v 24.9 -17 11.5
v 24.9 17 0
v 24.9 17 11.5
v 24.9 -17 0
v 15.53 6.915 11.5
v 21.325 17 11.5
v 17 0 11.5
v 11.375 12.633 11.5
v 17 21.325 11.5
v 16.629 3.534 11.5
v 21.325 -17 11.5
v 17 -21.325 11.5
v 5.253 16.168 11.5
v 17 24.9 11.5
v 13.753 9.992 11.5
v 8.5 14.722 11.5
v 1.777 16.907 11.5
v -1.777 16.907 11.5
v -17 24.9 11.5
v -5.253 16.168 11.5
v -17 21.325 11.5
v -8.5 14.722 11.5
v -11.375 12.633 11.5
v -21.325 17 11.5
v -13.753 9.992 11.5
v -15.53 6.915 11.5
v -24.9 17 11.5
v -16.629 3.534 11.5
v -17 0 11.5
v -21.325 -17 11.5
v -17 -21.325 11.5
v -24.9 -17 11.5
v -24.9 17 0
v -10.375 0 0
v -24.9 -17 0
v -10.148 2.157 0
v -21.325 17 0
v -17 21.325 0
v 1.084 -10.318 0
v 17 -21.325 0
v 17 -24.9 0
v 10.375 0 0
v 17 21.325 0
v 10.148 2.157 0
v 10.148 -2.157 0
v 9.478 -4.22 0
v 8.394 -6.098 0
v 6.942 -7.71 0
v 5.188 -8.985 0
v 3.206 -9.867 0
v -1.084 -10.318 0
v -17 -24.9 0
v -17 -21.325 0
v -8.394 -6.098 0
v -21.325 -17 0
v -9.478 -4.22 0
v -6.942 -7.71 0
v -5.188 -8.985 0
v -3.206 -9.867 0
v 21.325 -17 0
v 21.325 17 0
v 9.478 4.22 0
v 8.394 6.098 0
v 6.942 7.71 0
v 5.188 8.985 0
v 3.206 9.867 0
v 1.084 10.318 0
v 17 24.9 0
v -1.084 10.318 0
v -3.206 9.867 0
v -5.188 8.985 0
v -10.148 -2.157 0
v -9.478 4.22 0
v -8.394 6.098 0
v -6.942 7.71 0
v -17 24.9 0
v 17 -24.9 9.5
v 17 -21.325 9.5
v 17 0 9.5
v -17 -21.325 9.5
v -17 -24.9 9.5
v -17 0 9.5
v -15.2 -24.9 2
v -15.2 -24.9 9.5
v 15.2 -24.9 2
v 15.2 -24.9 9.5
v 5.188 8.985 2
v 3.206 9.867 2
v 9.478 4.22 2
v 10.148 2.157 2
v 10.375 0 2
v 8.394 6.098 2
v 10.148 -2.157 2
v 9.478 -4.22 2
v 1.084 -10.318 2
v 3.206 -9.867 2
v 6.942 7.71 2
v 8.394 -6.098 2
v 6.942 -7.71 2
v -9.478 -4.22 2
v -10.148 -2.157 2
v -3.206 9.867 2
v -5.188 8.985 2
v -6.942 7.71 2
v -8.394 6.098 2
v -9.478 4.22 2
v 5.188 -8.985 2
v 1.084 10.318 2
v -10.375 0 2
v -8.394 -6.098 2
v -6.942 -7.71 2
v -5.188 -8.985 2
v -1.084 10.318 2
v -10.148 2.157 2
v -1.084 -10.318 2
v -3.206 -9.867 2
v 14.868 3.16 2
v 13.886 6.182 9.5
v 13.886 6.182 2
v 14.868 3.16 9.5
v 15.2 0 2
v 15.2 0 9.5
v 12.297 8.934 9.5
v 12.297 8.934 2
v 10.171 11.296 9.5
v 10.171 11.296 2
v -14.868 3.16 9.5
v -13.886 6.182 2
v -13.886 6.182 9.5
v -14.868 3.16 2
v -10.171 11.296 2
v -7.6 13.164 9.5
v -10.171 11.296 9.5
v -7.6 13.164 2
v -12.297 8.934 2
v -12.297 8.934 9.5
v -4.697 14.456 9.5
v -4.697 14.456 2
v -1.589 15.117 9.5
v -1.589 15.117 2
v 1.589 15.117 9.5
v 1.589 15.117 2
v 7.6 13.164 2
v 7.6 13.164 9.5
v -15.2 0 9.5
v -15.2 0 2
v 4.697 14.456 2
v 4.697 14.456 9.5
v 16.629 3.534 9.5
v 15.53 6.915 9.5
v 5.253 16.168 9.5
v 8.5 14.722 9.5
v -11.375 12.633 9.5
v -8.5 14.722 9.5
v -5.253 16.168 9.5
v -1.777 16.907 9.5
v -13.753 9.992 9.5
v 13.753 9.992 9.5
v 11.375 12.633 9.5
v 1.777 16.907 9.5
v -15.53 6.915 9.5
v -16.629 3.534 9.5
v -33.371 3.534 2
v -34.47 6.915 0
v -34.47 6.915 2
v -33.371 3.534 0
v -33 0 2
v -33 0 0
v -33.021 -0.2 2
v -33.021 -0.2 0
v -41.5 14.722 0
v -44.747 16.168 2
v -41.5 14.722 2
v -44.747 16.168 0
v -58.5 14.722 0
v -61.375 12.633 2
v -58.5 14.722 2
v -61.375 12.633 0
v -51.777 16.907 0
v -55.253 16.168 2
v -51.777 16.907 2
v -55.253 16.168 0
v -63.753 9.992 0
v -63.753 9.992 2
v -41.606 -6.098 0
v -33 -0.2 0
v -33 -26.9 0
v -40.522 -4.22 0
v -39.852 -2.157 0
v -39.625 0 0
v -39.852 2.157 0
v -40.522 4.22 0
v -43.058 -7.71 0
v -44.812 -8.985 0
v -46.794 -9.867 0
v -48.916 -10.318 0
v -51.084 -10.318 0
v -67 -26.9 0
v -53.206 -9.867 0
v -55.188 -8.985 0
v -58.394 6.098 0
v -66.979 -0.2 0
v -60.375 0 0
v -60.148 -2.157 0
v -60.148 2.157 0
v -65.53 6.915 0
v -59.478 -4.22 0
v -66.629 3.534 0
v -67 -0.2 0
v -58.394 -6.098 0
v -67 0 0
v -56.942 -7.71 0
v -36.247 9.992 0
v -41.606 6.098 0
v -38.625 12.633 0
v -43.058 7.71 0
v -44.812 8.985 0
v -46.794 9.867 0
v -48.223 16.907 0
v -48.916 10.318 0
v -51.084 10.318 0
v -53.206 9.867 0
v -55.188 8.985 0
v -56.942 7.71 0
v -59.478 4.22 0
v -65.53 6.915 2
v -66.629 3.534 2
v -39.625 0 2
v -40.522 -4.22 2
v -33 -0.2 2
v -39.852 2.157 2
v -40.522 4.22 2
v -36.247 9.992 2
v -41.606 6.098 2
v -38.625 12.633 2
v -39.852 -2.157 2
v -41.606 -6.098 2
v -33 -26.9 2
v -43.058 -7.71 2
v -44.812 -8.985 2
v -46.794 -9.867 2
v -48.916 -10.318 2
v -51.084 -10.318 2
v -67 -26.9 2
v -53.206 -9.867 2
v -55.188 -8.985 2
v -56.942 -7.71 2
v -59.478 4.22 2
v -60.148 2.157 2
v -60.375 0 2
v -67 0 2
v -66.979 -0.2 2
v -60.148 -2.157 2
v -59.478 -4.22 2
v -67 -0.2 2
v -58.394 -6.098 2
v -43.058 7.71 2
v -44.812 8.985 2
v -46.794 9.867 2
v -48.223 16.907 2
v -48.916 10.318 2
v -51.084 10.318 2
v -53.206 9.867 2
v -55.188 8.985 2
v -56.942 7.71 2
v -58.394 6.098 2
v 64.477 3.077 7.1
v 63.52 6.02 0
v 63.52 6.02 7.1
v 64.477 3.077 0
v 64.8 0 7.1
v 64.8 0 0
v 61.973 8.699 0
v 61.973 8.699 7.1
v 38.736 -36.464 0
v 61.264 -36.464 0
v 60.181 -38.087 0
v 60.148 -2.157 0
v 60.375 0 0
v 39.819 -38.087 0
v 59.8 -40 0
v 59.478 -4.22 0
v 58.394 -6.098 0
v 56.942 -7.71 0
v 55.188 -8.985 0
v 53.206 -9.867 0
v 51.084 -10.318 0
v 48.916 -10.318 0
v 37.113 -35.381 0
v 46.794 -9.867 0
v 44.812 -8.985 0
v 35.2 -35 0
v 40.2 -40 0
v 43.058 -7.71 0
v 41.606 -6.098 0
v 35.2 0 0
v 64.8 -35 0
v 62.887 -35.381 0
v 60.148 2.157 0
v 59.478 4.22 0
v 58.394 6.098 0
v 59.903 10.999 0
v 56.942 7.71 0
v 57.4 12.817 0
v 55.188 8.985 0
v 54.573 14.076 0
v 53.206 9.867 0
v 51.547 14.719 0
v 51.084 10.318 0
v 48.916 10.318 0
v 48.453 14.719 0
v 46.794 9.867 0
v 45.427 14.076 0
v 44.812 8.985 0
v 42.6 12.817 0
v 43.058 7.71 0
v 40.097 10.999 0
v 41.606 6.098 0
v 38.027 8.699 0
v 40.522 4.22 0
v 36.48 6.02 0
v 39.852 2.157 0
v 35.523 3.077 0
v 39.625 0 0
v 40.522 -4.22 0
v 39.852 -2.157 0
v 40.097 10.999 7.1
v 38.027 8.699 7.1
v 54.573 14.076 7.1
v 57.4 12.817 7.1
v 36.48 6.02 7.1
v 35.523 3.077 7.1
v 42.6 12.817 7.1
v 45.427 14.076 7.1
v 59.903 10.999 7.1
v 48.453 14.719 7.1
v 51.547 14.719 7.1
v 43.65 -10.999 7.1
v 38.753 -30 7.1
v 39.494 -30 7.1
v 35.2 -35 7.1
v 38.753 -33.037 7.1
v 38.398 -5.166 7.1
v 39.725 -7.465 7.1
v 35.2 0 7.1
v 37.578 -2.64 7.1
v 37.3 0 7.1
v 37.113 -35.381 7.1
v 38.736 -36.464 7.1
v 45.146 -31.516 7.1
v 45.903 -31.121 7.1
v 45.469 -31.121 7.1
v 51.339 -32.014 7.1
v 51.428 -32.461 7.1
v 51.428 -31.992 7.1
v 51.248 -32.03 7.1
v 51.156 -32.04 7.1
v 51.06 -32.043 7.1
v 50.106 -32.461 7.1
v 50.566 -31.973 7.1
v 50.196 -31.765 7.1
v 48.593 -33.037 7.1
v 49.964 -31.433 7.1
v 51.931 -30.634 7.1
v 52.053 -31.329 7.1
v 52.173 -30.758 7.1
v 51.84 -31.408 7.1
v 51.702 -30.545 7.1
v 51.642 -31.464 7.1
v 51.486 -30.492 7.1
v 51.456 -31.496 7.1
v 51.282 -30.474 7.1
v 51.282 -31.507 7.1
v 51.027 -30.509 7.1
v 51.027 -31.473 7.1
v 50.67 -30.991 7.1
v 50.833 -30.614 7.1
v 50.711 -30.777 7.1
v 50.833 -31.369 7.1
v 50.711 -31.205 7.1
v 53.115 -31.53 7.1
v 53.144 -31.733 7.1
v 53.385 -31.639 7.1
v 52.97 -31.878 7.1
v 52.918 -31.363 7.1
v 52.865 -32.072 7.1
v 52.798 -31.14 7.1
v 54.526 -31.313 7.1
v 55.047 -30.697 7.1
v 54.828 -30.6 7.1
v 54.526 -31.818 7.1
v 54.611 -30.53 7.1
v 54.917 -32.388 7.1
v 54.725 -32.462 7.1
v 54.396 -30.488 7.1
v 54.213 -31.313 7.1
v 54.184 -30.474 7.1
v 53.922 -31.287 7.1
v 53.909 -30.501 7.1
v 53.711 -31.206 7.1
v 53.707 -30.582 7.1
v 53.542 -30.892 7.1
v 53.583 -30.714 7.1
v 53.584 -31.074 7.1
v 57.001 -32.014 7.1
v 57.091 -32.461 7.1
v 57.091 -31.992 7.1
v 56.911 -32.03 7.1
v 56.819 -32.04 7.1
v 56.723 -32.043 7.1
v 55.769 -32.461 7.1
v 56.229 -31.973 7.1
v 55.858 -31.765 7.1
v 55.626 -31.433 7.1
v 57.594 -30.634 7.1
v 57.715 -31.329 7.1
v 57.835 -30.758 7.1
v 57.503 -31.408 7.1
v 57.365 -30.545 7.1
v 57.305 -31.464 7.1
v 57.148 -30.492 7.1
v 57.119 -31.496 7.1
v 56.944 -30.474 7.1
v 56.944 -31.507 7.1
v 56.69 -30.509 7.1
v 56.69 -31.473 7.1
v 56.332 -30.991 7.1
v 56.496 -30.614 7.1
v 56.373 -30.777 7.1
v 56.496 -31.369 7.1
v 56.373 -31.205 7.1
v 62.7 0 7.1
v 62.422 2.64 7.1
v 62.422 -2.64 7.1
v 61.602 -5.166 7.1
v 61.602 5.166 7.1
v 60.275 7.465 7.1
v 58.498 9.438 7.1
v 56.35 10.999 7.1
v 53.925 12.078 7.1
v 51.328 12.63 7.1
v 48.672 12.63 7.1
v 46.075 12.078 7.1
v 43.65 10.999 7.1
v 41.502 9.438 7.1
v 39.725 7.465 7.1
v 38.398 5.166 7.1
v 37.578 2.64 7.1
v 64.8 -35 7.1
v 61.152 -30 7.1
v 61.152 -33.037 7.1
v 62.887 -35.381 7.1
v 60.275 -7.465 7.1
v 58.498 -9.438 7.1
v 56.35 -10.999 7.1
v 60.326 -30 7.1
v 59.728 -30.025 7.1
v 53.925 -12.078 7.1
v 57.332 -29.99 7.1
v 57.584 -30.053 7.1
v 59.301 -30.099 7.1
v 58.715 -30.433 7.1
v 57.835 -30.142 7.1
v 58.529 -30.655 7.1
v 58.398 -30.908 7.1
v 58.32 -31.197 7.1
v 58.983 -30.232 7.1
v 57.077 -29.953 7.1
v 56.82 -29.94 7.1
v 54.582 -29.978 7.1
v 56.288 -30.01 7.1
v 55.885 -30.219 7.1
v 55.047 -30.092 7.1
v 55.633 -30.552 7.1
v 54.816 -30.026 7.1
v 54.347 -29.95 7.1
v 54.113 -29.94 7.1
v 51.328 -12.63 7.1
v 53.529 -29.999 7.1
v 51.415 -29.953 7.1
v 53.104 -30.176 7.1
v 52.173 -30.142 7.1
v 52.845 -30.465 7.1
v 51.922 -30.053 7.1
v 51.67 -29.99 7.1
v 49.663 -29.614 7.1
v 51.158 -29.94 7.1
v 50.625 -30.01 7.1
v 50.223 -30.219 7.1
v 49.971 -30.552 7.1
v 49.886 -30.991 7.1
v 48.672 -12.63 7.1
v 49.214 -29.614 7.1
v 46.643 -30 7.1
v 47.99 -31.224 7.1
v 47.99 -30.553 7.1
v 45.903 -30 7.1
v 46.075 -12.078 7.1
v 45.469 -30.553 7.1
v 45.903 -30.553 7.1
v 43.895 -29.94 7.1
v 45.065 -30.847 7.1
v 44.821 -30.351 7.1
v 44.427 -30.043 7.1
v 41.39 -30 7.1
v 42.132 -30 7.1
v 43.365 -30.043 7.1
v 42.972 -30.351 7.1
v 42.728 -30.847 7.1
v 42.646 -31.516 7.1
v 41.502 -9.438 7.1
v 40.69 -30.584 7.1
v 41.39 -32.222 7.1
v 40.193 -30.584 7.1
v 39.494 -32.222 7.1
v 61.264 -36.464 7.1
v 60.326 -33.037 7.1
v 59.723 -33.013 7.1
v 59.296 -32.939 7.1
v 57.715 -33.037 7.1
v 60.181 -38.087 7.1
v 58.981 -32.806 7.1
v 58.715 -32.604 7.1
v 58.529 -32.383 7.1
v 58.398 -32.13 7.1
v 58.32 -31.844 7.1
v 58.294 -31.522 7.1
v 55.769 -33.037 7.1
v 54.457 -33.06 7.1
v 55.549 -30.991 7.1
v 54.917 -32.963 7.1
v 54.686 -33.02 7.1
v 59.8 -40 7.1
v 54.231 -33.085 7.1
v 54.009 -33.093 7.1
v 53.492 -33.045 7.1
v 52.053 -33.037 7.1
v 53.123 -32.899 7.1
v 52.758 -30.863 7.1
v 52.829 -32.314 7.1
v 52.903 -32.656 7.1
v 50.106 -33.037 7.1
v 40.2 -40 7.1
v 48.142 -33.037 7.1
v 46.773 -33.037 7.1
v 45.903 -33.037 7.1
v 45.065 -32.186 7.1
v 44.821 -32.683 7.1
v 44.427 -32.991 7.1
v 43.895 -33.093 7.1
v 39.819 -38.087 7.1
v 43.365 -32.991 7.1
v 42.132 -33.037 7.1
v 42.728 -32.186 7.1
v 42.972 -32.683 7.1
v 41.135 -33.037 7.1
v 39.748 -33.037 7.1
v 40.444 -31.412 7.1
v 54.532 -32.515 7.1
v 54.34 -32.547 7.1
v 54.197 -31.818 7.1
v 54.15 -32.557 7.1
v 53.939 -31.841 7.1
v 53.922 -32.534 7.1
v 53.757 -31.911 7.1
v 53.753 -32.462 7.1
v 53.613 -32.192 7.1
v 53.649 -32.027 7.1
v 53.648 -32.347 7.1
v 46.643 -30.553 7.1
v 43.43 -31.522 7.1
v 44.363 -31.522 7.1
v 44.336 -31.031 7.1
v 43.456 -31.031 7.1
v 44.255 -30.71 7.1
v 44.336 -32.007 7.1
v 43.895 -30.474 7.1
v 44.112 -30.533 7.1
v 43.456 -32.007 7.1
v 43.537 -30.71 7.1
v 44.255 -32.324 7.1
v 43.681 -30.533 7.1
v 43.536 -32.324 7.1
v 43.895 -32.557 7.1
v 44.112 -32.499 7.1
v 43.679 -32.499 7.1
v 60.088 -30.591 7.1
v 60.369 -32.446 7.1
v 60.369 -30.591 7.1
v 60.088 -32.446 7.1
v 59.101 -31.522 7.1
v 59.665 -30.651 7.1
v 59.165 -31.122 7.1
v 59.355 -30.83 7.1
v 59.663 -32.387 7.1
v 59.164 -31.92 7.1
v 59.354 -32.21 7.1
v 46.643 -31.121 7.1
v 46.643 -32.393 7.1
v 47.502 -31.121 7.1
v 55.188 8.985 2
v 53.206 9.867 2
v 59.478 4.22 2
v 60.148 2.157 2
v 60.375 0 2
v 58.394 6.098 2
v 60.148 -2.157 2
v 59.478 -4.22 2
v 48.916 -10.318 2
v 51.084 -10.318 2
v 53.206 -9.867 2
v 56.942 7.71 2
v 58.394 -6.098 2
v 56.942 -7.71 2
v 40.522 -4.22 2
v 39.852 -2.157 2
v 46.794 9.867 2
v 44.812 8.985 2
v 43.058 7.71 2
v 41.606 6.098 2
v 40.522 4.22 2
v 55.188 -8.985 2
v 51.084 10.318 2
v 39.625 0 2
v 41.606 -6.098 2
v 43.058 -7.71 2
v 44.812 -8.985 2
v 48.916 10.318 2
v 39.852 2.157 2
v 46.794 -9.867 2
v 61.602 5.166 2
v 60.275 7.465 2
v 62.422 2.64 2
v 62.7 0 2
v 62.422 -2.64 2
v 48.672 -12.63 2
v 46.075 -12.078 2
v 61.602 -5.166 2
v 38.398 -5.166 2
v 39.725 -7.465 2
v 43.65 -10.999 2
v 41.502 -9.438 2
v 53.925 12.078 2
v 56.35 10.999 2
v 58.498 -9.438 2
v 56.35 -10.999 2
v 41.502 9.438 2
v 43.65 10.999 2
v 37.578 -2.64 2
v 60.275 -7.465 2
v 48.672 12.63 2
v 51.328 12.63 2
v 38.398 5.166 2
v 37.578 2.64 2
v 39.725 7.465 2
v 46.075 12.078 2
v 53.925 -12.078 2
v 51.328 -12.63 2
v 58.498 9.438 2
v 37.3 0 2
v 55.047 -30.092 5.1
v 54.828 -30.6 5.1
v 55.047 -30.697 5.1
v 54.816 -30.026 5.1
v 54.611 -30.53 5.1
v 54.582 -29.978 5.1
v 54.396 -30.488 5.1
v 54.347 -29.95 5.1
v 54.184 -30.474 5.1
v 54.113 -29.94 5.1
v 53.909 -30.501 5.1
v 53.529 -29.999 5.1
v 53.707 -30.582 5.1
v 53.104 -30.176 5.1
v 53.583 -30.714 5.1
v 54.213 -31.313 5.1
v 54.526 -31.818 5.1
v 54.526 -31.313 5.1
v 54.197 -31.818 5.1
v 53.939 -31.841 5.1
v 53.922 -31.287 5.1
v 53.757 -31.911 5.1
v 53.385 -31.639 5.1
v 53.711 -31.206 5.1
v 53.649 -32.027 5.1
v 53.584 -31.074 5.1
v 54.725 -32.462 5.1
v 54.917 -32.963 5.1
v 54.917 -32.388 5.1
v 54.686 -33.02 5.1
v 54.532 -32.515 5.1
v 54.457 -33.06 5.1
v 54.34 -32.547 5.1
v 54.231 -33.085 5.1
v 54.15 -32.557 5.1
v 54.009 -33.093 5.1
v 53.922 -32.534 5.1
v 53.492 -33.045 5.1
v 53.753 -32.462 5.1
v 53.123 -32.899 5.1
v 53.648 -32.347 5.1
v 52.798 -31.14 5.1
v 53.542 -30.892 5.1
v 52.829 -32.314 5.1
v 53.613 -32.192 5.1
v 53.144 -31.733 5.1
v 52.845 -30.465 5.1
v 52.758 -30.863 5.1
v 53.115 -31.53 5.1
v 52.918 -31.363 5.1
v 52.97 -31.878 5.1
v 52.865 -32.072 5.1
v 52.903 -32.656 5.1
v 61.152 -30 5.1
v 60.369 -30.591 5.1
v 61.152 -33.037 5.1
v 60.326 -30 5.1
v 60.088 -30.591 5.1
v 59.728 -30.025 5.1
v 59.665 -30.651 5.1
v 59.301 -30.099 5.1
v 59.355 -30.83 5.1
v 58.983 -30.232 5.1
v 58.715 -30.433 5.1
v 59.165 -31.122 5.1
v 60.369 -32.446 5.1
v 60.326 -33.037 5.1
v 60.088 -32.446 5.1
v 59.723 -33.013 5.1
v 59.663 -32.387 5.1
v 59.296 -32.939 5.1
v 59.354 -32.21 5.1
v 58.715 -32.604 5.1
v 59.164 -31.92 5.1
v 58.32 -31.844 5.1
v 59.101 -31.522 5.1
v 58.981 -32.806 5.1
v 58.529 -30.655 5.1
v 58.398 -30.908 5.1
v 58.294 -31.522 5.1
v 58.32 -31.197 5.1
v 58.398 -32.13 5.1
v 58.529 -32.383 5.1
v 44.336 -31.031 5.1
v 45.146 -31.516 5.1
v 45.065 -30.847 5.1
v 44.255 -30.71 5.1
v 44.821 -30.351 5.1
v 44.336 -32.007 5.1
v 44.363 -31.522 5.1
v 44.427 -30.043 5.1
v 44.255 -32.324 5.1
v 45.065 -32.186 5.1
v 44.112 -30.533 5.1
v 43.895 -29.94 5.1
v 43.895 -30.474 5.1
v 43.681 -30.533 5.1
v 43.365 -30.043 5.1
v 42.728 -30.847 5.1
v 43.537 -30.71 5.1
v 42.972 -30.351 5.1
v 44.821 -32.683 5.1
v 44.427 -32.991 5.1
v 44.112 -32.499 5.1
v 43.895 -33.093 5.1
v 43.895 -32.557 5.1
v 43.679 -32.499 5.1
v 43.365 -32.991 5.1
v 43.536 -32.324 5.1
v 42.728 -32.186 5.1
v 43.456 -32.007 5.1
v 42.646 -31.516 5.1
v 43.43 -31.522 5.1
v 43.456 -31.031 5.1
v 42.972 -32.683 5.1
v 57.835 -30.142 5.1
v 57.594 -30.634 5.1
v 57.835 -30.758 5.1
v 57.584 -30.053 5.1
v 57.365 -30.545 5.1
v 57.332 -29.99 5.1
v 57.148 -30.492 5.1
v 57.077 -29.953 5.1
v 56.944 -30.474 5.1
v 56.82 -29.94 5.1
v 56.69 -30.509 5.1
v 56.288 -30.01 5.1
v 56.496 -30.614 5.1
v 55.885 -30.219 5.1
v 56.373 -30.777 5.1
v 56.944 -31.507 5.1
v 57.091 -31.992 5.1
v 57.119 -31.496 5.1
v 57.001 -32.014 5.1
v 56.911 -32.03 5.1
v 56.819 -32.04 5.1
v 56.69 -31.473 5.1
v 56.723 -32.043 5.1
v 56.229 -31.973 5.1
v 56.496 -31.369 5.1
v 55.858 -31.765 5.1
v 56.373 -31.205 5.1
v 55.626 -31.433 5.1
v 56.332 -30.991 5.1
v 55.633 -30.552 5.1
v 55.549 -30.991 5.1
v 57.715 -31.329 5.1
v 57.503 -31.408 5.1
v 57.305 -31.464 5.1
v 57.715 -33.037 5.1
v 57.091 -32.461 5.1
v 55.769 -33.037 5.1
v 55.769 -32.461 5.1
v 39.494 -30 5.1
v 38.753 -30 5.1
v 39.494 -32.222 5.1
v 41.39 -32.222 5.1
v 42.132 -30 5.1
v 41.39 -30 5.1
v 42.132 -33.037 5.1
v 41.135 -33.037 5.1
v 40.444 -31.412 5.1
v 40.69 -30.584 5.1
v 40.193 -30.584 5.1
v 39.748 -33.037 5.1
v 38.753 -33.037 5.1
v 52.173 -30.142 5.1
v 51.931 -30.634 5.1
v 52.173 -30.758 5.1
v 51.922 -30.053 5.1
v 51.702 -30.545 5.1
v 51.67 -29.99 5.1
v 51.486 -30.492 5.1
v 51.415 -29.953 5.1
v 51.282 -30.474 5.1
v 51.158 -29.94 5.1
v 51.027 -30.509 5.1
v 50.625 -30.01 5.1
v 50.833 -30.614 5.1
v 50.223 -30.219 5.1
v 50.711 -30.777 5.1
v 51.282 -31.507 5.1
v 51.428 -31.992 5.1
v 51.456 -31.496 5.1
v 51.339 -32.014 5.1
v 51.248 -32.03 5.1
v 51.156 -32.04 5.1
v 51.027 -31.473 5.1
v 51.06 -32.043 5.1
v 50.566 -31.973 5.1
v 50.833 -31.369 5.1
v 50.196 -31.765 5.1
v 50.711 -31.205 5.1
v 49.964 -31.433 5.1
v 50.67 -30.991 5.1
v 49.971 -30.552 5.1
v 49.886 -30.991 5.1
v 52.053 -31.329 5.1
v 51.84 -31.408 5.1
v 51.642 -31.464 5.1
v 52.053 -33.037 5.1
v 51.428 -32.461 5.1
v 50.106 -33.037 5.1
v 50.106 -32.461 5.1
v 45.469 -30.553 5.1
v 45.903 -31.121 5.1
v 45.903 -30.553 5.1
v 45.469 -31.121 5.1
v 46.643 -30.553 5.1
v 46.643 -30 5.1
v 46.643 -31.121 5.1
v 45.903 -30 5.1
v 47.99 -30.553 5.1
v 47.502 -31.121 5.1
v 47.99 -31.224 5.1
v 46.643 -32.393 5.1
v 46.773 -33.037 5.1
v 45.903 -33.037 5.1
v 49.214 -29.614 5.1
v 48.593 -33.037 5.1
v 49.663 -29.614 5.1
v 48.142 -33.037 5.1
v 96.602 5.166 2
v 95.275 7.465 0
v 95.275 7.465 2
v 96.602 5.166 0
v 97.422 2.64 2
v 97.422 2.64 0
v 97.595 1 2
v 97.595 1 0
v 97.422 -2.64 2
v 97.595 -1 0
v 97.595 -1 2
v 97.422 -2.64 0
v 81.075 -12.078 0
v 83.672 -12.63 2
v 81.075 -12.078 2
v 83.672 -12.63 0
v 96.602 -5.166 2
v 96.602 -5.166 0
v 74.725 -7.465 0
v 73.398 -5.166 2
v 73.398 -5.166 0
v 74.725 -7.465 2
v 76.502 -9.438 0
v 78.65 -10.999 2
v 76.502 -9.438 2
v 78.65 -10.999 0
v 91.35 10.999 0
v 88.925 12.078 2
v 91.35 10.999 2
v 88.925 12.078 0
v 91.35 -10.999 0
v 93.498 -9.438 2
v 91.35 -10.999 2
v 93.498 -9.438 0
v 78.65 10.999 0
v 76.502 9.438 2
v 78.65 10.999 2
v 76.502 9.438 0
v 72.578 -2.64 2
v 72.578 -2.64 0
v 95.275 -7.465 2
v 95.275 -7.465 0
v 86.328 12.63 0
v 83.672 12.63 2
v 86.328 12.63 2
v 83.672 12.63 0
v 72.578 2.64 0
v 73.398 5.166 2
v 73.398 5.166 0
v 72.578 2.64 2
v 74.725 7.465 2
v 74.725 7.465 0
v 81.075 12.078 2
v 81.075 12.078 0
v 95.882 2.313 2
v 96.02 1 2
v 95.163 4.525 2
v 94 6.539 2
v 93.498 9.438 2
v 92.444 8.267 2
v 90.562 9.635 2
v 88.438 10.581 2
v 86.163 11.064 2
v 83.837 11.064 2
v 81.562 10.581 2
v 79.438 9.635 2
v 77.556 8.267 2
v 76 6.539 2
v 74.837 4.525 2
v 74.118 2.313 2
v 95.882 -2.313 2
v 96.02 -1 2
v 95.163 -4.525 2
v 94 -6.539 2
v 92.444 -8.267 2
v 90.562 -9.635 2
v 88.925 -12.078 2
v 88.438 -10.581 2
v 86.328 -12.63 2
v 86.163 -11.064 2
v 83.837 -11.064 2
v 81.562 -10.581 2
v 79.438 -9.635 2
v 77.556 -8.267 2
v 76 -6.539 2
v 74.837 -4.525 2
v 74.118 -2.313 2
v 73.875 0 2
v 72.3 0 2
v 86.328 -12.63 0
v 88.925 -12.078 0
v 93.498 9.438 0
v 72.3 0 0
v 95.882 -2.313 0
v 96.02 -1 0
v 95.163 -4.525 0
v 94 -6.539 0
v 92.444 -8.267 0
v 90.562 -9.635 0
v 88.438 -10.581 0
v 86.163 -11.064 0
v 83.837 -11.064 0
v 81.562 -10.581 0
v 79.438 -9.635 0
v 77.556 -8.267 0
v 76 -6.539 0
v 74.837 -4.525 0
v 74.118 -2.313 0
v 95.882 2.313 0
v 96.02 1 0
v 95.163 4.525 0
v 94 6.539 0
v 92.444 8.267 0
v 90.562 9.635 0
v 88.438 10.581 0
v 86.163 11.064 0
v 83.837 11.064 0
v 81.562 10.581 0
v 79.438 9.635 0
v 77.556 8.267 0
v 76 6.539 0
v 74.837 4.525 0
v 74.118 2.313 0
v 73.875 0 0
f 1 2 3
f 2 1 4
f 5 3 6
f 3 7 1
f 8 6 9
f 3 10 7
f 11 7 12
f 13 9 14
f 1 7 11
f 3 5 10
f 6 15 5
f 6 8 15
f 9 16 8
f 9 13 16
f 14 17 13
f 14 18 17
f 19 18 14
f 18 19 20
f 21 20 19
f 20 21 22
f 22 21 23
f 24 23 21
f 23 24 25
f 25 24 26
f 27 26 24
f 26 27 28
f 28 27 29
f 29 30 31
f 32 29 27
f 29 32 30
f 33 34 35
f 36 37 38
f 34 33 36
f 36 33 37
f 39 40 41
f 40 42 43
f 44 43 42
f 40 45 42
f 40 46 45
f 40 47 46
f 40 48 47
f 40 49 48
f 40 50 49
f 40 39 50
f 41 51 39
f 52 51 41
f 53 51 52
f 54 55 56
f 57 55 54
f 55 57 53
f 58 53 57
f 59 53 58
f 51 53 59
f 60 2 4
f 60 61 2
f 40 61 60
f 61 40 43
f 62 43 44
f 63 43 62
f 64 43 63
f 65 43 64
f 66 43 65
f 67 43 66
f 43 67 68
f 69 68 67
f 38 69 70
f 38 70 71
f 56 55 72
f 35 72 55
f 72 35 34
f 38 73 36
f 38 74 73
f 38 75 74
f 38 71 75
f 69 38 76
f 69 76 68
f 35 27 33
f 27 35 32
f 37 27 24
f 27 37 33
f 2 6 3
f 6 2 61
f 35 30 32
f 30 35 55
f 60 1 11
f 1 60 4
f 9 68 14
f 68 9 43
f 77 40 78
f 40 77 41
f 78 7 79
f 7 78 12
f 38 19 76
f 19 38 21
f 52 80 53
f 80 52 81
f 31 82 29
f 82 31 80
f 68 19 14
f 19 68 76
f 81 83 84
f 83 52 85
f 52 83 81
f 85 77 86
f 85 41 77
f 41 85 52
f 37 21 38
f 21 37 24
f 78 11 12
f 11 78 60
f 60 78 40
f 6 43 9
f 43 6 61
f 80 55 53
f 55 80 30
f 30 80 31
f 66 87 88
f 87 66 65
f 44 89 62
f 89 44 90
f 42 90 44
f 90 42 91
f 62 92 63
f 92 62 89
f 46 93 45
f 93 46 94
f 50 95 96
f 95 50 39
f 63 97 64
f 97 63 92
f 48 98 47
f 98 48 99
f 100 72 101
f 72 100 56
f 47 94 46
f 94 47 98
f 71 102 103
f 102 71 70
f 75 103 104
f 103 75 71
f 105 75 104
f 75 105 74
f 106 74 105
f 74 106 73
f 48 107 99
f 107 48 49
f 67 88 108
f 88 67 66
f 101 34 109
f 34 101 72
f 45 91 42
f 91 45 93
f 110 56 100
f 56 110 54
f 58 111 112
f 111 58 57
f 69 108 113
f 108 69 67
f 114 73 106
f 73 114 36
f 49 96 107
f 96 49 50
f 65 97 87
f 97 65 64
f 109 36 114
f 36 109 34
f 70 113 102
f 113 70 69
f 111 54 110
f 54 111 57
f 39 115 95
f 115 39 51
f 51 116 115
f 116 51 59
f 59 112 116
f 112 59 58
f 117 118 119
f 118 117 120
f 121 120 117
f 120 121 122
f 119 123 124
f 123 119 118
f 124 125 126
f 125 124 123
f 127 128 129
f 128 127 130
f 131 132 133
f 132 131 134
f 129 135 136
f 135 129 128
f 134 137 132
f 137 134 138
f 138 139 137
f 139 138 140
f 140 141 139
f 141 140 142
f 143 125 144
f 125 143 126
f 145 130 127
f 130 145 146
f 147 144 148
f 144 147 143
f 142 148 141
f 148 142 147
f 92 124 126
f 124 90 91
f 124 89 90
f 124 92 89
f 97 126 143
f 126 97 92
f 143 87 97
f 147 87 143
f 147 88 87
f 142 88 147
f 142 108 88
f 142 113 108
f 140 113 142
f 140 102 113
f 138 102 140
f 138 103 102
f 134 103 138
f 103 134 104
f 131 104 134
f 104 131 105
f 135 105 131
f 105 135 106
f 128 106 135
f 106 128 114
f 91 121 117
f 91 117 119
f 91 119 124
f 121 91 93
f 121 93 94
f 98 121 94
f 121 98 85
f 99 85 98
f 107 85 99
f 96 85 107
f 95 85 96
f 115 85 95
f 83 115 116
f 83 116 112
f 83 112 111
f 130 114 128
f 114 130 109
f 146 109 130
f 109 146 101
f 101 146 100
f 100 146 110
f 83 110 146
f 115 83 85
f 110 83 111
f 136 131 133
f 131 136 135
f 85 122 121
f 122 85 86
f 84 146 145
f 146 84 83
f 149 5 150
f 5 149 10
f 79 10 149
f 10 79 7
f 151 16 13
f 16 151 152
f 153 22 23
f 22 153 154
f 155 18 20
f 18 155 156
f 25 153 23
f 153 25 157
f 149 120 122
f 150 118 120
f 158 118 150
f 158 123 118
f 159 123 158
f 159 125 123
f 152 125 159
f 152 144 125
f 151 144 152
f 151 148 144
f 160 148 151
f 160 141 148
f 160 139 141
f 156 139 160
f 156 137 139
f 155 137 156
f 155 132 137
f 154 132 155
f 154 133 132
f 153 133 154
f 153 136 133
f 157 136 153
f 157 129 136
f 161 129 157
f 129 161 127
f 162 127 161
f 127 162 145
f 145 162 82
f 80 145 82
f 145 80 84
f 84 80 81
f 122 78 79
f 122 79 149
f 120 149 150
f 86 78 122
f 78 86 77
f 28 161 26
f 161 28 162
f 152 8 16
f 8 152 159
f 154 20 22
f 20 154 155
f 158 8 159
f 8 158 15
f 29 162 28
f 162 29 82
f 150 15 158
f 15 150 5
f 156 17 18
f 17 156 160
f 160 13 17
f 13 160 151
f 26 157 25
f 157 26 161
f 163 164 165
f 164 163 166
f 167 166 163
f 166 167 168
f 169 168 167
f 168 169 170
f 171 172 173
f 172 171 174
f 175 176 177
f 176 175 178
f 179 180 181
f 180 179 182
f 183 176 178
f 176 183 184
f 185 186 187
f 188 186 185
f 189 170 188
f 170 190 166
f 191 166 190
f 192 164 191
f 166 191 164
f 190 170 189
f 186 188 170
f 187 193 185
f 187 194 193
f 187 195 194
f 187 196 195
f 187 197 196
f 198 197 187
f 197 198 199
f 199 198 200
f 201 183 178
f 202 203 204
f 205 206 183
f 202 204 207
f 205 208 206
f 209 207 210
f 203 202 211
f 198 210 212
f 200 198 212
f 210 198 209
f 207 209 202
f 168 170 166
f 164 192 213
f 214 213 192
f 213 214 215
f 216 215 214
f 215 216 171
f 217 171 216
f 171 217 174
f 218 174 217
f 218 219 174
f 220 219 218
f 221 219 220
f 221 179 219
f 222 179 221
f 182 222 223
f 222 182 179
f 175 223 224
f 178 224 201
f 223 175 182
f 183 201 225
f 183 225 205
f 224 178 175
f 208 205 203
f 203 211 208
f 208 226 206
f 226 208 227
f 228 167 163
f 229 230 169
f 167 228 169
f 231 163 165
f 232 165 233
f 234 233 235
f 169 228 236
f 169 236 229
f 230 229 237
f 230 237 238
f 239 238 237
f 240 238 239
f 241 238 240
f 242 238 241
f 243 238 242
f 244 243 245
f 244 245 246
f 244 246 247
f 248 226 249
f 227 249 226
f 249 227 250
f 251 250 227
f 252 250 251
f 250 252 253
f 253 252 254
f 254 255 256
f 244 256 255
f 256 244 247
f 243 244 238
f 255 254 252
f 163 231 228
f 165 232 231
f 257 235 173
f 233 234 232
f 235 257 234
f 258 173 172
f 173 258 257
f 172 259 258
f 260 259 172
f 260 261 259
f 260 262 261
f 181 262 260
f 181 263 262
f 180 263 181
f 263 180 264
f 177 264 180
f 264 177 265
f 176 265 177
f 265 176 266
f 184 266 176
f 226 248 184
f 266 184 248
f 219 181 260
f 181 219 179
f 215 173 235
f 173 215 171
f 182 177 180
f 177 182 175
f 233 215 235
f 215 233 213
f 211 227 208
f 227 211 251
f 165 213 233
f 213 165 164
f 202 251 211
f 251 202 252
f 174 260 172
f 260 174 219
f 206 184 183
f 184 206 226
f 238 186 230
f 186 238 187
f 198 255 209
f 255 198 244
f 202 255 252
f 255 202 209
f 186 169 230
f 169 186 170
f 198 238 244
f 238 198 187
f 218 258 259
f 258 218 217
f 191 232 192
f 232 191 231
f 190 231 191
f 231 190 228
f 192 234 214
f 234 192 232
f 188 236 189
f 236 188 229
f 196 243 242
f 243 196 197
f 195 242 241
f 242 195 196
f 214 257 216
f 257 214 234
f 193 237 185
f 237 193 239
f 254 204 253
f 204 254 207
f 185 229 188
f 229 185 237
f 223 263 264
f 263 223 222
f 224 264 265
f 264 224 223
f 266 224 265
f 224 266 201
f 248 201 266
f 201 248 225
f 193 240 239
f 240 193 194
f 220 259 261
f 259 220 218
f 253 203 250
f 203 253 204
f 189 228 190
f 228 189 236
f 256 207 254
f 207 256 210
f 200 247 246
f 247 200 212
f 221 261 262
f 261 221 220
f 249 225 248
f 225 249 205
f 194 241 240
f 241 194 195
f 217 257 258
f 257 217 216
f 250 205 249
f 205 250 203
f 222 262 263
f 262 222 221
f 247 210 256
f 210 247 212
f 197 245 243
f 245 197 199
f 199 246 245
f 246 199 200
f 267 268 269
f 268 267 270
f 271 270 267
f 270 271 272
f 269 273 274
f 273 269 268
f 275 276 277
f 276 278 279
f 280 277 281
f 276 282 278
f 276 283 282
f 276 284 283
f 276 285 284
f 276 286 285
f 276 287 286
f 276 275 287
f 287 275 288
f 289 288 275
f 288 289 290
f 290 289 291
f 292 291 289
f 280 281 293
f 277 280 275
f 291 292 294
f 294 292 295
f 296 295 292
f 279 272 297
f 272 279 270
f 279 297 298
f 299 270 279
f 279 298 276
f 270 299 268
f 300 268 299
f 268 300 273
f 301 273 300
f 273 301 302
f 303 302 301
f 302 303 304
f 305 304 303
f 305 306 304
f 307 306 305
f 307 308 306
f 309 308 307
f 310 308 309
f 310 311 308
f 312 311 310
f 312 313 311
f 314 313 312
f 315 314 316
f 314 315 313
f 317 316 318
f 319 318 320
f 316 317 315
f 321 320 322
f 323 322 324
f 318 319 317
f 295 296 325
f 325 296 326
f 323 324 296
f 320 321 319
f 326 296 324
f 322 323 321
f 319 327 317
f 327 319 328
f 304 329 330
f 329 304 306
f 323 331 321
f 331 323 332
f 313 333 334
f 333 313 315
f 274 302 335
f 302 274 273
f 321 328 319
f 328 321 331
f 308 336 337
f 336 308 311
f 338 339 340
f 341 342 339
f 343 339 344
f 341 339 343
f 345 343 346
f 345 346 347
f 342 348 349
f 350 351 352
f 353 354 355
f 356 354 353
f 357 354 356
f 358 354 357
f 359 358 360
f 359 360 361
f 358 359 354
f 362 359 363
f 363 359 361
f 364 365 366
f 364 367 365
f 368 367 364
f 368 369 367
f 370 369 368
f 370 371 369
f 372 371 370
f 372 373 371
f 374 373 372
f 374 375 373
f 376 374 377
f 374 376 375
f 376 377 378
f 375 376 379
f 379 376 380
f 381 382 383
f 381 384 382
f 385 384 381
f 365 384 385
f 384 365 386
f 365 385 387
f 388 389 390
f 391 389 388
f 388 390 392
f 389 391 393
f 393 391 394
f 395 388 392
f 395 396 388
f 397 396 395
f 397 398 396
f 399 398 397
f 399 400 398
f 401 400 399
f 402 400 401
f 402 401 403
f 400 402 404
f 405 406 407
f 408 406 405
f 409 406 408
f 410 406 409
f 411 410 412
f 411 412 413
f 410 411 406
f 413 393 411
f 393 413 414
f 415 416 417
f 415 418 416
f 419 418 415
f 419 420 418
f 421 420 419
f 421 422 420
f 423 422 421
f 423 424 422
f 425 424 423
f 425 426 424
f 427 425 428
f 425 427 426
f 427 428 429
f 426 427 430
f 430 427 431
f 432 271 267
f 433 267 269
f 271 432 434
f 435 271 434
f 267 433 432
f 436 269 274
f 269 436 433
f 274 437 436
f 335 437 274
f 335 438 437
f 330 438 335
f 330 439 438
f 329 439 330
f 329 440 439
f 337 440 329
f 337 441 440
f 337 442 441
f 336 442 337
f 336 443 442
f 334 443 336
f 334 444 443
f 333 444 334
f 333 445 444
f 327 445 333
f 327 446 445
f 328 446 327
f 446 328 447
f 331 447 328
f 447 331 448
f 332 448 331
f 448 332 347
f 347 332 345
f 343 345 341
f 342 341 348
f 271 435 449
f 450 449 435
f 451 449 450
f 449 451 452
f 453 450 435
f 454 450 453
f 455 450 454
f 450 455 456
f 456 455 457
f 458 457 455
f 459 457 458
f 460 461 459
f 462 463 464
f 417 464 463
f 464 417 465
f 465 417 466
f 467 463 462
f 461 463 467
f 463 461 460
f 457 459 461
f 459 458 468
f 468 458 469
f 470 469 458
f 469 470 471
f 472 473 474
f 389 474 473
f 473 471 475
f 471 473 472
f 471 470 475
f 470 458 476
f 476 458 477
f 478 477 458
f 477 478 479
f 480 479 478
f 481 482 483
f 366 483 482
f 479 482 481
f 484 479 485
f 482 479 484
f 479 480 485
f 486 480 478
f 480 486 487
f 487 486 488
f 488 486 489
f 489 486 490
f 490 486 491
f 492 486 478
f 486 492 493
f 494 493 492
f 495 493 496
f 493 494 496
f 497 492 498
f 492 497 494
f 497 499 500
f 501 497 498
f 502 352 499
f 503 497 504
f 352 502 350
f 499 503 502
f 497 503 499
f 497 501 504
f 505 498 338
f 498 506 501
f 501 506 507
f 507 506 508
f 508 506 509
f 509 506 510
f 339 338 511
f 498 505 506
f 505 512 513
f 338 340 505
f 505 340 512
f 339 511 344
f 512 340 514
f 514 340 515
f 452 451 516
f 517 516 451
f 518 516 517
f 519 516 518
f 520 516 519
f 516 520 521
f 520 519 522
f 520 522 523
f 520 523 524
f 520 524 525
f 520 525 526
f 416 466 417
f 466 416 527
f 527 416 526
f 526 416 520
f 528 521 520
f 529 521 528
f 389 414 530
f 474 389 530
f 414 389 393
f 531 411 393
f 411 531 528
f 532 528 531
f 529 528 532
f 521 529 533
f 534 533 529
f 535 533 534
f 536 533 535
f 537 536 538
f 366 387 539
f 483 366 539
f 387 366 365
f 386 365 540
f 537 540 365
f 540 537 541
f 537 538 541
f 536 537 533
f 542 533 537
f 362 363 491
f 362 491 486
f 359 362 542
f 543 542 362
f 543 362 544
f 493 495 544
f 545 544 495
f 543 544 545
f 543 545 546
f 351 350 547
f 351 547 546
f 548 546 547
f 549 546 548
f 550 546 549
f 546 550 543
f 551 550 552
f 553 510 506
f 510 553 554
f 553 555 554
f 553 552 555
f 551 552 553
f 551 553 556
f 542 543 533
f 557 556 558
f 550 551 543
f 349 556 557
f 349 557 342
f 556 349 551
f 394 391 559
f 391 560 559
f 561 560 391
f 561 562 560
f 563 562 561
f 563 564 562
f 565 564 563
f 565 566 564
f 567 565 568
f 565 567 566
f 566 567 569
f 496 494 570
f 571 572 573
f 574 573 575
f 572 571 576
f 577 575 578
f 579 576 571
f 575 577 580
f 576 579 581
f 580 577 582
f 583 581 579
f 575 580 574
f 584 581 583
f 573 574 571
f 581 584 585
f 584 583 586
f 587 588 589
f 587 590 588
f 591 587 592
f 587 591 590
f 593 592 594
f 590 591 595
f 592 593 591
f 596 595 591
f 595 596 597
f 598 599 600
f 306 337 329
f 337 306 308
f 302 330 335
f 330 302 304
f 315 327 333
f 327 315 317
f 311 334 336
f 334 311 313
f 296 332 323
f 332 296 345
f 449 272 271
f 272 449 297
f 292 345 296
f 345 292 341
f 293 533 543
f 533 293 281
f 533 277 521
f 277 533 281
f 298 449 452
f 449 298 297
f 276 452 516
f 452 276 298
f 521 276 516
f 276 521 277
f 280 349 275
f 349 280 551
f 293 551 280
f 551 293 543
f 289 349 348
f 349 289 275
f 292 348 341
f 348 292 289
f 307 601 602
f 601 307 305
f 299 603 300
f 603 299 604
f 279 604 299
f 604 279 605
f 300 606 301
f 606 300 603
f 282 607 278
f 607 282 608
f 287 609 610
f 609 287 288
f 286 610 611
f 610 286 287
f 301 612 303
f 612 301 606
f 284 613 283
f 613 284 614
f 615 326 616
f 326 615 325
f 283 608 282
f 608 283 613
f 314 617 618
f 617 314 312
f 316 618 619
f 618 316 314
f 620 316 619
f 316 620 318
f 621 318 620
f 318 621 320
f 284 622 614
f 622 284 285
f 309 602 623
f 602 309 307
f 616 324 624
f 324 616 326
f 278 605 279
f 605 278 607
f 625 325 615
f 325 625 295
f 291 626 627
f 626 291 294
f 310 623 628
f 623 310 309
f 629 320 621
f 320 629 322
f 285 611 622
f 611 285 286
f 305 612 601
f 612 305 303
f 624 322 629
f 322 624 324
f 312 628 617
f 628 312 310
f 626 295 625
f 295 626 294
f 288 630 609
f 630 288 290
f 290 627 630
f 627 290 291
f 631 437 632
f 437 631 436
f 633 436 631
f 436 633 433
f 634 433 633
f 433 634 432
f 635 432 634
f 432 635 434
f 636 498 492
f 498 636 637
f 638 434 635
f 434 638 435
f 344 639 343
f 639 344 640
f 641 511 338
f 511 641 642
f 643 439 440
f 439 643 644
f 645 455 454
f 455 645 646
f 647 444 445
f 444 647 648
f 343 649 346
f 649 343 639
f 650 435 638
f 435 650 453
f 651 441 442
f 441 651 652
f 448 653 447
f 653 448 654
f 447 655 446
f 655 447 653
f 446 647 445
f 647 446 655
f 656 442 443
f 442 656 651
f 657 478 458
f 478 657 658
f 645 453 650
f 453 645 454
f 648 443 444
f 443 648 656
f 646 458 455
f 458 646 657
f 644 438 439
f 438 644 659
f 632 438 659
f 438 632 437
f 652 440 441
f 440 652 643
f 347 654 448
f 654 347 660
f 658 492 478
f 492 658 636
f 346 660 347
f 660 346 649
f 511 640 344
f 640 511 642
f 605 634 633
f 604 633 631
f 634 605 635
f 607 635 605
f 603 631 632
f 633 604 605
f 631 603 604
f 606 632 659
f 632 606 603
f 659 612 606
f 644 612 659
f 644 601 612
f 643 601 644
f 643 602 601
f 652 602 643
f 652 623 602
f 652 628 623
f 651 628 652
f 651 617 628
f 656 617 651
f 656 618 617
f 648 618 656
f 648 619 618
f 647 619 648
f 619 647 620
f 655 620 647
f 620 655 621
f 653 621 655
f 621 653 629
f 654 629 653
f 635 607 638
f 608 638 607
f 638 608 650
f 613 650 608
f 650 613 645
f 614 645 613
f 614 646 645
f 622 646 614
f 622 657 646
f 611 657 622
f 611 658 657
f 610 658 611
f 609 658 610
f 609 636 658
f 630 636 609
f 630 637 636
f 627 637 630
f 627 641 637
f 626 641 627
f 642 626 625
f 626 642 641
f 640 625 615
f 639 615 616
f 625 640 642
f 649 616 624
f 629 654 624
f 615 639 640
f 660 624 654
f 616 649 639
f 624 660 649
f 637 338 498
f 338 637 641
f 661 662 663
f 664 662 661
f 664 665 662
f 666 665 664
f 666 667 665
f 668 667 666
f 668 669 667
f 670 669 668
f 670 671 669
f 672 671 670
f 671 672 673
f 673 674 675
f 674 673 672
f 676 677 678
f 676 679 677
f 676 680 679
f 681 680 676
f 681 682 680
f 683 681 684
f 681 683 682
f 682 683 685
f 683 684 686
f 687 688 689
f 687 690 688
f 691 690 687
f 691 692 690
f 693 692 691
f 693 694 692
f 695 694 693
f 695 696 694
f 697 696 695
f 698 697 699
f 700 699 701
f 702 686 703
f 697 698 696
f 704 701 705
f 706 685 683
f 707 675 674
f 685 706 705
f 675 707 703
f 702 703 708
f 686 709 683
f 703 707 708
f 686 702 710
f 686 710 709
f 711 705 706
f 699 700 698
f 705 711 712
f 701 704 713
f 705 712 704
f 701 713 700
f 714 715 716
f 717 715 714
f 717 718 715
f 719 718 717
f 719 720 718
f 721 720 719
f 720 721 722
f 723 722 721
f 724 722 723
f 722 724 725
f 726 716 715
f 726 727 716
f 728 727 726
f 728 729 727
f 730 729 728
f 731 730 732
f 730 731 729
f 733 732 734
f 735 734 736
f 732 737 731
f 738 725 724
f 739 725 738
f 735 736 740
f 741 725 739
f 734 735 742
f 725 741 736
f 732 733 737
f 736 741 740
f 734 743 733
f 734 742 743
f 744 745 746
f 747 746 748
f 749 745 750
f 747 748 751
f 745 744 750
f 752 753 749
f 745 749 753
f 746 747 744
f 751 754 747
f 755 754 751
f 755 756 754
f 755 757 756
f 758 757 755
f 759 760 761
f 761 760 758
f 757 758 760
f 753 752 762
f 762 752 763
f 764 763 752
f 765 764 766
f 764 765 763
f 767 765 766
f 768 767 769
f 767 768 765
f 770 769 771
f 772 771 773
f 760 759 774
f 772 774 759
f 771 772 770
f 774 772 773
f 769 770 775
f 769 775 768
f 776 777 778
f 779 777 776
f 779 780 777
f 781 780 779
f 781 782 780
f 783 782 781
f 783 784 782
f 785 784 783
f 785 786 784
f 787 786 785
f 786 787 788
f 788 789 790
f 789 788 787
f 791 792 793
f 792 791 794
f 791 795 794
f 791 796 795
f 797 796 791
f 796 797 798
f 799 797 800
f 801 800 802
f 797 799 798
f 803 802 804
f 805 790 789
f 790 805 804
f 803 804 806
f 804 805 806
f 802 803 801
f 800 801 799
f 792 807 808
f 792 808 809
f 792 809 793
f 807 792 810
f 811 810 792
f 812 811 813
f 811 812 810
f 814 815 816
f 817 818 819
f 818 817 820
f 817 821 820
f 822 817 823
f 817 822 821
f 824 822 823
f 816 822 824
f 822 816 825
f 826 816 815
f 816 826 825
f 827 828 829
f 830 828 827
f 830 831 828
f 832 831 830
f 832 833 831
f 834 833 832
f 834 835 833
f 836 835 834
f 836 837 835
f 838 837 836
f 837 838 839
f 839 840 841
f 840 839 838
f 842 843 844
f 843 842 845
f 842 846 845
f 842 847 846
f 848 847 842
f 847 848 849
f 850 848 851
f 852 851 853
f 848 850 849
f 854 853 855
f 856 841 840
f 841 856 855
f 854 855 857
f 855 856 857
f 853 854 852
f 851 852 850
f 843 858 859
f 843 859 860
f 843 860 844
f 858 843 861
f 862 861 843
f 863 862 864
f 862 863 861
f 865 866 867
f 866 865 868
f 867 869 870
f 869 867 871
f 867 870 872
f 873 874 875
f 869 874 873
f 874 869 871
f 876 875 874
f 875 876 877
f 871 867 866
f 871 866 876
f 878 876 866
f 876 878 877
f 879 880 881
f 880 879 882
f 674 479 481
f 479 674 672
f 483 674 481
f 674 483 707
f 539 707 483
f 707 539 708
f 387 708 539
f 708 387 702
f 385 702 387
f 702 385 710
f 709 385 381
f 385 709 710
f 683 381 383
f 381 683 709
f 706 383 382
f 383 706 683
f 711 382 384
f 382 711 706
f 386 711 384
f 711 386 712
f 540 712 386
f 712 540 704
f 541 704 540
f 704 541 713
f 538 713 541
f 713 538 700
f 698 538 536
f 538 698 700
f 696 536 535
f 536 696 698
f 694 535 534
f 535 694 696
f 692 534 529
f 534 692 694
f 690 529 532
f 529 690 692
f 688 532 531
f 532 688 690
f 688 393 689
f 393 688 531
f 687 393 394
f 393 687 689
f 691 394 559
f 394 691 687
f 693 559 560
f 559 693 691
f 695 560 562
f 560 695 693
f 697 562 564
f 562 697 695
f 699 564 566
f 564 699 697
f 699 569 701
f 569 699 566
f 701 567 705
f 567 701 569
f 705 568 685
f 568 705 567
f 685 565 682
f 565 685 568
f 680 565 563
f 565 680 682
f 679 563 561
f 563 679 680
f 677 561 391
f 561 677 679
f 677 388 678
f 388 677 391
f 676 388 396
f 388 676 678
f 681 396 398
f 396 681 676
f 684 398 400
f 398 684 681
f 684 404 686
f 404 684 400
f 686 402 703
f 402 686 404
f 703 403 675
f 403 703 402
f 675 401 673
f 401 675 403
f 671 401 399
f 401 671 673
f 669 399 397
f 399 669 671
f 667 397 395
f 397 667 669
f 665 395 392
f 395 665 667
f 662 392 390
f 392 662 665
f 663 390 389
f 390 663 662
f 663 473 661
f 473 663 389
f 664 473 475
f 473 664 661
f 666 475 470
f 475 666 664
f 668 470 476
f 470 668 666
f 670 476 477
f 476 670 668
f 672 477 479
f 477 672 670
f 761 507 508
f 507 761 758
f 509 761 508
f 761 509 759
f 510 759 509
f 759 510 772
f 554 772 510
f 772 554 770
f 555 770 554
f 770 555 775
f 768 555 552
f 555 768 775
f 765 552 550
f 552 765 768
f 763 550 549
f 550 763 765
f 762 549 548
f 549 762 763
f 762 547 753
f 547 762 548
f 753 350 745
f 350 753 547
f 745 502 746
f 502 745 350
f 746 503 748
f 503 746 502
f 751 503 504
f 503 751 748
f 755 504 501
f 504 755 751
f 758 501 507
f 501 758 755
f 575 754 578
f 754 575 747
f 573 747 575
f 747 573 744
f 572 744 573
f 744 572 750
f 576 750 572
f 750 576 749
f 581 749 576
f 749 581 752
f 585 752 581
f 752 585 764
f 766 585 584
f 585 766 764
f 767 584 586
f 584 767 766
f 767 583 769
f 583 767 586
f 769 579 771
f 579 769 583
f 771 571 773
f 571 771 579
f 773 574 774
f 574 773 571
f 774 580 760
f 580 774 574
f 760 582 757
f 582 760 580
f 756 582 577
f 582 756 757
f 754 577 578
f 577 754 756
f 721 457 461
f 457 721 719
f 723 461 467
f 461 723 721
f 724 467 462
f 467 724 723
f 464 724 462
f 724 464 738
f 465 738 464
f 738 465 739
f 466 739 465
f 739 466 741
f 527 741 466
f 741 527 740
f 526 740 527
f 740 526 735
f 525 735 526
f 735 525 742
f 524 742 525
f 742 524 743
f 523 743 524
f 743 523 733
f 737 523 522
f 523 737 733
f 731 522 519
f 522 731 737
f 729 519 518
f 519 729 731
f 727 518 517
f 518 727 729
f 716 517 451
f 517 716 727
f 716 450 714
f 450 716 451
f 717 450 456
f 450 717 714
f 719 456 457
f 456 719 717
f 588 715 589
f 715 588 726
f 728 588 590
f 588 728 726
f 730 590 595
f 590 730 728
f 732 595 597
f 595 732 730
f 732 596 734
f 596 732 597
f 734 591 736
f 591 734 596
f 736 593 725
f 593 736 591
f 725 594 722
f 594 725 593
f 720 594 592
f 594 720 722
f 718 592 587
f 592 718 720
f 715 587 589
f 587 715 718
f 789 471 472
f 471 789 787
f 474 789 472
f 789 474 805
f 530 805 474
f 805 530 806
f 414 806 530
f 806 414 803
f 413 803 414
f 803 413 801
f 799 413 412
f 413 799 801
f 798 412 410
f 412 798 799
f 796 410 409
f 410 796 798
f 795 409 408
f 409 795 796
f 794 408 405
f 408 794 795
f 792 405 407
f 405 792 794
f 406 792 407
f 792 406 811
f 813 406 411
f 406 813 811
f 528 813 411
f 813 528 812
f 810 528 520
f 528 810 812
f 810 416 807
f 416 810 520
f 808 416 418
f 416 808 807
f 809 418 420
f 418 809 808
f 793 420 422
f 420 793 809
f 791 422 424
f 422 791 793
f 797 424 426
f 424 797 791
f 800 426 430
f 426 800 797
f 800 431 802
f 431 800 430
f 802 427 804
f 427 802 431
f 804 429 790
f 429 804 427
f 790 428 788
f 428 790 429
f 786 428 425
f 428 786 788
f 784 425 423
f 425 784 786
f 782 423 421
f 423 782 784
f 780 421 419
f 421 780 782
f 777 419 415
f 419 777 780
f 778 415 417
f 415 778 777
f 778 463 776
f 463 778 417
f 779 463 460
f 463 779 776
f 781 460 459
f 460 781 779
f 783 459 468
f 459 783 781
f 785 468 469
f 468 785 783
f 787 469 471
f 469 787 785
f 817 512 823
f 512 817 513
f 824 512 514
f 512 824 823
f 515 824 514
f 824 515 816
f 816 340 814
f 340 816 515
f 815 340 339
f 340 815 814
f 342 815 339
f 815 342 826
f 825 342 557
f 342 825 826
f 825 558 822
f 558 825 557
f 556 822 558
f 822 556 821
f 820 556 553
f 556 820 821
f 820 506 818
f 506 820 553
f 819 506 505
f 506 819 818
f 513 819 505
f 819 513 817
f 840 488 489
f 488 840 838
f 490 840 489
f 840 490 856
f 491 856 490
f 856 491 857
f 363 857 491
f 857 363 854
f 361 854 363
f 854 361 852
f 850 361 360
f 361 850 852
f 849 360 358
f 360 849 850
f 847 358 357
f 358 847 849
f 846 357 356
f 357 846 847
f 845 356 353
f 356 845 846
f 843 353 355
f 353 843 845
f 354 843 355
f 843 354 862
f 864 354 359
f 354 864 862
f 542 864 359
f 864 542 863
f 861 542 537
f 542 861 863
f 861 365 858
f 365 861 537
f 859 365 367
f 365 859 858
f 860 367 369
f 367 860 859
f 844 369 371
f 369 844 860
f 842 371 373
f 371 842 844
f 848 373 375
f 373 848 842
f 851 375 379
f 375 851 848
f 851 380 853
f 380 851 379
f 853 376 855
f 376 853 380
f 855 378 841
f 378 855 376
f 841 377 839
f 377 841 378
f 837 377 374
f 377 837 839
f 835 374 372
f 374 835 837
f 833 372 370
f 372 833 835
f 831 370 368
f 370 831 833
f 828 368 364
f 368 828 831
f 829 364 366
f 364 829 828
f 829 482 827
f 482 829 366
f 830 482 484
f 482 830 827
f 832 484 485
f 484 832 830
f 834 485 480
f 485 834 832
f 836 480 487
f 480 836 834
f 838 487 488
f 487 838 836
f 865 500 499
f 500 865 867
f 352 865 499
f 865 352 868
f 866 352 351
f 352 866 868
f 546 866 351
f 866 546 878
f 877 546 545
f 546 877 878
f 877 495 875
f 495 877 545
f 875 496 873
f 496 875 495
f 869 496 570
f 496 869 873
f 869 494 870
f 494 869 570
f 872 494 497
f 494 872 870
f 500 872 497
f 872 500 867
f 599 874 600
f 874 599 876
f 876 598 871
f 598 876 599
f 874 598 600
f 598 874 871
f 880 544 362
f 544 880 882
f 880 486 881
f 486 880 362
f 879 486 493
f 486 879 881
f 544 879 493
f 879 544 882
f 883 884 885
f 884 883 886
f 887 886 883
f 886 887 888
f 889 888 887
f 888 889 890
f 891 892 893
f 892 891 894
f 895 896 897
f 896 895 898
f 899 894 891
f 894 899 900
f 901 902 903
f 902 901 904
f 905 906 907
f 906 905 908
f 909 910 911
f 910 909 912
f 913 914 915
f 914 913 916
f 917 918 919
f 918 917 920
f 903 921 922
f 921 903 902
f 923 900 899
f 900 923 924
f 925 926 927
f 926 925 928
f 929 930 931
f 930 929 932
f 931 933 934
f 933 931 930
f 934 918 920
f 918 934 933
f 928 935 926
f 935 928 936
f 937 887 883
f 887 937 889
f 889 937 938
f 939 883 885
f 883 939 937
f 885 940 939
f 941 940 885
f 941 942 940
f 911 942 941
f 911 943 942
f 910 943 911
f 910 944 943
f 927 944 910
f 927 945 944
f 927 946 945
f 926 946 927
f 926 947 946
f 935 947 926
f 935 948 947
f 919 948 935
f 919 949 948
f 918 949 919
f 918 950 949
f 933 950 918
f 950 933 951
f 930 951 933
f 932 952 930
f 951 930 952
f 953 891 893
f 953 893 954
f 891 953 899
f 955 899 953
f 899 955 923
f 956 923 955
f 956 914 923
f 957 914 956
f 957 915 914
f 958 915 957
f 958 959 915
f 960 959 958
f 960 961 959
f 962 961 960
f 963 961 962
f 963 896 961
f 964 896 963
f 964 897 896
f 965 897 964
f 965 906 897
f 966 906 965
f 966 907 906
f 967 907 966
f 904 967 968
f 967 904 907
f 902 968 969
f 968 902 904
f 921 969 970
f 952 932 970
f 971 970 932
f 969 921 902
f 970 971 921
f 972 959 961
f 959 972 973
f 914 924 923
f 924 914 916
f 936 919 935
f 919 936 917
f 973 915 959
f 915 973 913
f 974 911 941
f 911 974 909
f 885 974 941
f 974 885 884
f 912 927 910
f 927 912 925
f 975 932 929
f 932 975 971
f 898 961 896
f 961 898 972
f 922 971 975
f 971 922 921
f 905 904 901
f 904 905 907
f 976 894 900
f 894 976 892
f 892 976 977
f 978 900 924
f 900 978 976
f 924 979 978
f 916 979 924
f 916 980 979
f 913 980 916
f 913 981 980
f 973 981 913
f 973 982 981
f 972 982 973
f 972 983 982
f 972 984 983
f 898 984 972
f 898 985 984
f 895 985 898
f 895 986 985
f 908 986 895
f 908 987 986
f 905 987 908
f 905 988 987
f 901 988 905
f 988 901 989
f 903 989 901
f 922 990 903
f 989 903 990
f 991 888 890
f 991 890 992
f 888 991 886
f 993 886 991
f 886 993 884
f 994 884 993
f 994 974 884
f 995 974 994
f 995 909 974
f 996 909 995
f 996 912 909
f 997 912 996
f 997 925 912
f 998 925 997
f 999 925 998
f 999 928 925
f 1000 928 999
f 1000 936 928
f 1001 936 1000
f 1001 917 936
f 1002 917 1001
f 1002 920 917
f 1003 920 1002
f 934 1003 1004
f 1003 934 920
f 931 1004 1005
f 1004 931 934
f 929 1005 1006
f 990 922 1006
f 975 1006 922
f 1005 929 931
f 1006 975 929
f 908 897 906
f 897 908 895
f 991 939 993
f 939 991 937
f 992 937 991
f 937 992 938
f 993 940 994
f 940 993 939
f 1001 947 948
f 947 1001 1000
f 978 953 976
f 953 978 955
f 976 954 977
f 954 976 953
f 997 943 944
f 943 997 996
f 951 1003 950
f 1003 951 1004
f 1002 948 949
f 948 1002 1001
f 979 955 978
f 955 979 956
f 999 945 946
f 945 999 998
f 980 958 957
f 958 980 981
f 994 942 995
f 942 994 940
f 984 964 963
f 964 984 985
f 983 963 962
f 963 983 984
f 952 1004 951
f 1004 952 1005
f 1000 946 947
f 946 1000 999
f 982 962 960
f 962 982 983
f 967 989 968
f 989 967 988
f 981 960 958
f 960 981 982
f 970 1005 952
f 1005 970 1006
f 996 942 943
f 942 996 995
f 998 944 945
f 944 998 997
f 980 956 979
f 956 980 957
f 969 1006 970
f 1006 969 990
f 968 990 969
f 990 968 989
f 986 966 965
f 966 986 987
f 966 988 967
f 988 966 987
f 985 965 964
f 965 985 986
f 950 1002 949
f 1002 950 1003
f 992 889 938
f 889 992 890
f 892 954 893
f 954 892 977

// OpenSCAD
//Cube insert for 25 mm filters
filter_d = 25;
filter_aperture = 20.75;
filter_h = 3.5; // 3.45 (3.5) or 4.95 (5)
filter_name = "D535/40M";

holder_h = filter_h + 4;
slide_w = 30;
cap_w = 2;

/* [Hiden] */
a = 49.8;
b = 33.6;
c = 6.28;
d = 53.8;
h = holder_h + cap_w + 2;
IM_offset = 0.2;


module Insert () {
    translate([0, 0, h/2])
    difference(){
        union() {   //basic insert design
            cube([a,b+2*IM_offset,h], center=true);
            cube([b+2*IM_offset,a,h], center=true);
            rotate(a=[0,0,45]){
                cube([c,d+2*IM_offset,h], center=true);
            }
            rotate(a=[0,0,-45]){
                cube([c,d+2*IM_offset,h], center=true);
            }
        }
    }
}


module SliderInsert () {
    difference() {
        Insert();
        cylinder(d=filter_aperture, h=h);  // aperture
        
        // main slot
        translate([0,0,2])  
           cylinder(d=slide_w+2*IM_offset, h=h-2);
        translate([0,-50/2,h/2+2])
            cube([slide_w+2*IM_offset,50,h], center=true);
        
        // cap step
        translate([0,0,h-cap_w])  
           cylinder(d=b+IM_offset*2, h=cap_w+IM_offset);
        translate([0,-50/2,h-cap_w+cap_w/2+IM_offset/2])
            cube([b+IM_offset*2,50,cap_w+IM_offset], center=true);
        
    }
}


module SliderCap () {
    difference() {
        union() {
            cylinder(d=b+IM_offset*2, h=cap_w);
            translate([-(b+IM_offset*2)/2,-d/2,0])
                cube([b+IM_offset*2,d/2-IM_offset,cap_w]);
        }
    cylinder(d=filter_aperture, h=h);  // aperture
    }
}


module FilterHolder () {
    l = 40;
    difference() {
        // solid part
        union() {
            cylinder(d=slide_w-2*IM_offset, 
                     h=holder_h-2*IM_offset);
            translate([-(slide_w-2*IM_offset)/2,-l,0])
                cube([slide_w-2*IM_offset,
                      l,
                      holder_h-2*IM_offset]);
        }
        translate([(slide_w-2*IM_offset)/2,-l,0])
            cylinder(d=10, h=holder_h-2*IM_offset);
        translate([-(slide_w-2*IM_offset)/2,-l,0])
            cylinder(d=10, h=holder_h-2*IM_offset);
        
        // filter hole
        cylinder(h=50, d=filter_aperture);
        translate([0,0,2])
            cylinder(h=50, d=filter_d+2*IM_offset);
        
        // text
        translate([0,-(l-10),holder_h-2*IM_offset-2])
        rotate([0,0,180])
            linear_extrude(height = 2)
                text(filter_name,
                     size=3,
                     font="Arial black:style=Bold",
                     halign = "center", spacing=1);
    }
}


module FilterClip () {
    difference() {
        cylinder(d=filter_d+2*IM_offset, h=2);
        cylinder(d=filter_aperture+1.5, h=2);
        translate([0,-1,0])
        cube([40,2,2]);
    }
}


SliderInsert();

translate([-50,0,0])
SliderCap ();

translate([50,0,0])
FilterHolder();

translate([85,0,0])
FilterClip();
